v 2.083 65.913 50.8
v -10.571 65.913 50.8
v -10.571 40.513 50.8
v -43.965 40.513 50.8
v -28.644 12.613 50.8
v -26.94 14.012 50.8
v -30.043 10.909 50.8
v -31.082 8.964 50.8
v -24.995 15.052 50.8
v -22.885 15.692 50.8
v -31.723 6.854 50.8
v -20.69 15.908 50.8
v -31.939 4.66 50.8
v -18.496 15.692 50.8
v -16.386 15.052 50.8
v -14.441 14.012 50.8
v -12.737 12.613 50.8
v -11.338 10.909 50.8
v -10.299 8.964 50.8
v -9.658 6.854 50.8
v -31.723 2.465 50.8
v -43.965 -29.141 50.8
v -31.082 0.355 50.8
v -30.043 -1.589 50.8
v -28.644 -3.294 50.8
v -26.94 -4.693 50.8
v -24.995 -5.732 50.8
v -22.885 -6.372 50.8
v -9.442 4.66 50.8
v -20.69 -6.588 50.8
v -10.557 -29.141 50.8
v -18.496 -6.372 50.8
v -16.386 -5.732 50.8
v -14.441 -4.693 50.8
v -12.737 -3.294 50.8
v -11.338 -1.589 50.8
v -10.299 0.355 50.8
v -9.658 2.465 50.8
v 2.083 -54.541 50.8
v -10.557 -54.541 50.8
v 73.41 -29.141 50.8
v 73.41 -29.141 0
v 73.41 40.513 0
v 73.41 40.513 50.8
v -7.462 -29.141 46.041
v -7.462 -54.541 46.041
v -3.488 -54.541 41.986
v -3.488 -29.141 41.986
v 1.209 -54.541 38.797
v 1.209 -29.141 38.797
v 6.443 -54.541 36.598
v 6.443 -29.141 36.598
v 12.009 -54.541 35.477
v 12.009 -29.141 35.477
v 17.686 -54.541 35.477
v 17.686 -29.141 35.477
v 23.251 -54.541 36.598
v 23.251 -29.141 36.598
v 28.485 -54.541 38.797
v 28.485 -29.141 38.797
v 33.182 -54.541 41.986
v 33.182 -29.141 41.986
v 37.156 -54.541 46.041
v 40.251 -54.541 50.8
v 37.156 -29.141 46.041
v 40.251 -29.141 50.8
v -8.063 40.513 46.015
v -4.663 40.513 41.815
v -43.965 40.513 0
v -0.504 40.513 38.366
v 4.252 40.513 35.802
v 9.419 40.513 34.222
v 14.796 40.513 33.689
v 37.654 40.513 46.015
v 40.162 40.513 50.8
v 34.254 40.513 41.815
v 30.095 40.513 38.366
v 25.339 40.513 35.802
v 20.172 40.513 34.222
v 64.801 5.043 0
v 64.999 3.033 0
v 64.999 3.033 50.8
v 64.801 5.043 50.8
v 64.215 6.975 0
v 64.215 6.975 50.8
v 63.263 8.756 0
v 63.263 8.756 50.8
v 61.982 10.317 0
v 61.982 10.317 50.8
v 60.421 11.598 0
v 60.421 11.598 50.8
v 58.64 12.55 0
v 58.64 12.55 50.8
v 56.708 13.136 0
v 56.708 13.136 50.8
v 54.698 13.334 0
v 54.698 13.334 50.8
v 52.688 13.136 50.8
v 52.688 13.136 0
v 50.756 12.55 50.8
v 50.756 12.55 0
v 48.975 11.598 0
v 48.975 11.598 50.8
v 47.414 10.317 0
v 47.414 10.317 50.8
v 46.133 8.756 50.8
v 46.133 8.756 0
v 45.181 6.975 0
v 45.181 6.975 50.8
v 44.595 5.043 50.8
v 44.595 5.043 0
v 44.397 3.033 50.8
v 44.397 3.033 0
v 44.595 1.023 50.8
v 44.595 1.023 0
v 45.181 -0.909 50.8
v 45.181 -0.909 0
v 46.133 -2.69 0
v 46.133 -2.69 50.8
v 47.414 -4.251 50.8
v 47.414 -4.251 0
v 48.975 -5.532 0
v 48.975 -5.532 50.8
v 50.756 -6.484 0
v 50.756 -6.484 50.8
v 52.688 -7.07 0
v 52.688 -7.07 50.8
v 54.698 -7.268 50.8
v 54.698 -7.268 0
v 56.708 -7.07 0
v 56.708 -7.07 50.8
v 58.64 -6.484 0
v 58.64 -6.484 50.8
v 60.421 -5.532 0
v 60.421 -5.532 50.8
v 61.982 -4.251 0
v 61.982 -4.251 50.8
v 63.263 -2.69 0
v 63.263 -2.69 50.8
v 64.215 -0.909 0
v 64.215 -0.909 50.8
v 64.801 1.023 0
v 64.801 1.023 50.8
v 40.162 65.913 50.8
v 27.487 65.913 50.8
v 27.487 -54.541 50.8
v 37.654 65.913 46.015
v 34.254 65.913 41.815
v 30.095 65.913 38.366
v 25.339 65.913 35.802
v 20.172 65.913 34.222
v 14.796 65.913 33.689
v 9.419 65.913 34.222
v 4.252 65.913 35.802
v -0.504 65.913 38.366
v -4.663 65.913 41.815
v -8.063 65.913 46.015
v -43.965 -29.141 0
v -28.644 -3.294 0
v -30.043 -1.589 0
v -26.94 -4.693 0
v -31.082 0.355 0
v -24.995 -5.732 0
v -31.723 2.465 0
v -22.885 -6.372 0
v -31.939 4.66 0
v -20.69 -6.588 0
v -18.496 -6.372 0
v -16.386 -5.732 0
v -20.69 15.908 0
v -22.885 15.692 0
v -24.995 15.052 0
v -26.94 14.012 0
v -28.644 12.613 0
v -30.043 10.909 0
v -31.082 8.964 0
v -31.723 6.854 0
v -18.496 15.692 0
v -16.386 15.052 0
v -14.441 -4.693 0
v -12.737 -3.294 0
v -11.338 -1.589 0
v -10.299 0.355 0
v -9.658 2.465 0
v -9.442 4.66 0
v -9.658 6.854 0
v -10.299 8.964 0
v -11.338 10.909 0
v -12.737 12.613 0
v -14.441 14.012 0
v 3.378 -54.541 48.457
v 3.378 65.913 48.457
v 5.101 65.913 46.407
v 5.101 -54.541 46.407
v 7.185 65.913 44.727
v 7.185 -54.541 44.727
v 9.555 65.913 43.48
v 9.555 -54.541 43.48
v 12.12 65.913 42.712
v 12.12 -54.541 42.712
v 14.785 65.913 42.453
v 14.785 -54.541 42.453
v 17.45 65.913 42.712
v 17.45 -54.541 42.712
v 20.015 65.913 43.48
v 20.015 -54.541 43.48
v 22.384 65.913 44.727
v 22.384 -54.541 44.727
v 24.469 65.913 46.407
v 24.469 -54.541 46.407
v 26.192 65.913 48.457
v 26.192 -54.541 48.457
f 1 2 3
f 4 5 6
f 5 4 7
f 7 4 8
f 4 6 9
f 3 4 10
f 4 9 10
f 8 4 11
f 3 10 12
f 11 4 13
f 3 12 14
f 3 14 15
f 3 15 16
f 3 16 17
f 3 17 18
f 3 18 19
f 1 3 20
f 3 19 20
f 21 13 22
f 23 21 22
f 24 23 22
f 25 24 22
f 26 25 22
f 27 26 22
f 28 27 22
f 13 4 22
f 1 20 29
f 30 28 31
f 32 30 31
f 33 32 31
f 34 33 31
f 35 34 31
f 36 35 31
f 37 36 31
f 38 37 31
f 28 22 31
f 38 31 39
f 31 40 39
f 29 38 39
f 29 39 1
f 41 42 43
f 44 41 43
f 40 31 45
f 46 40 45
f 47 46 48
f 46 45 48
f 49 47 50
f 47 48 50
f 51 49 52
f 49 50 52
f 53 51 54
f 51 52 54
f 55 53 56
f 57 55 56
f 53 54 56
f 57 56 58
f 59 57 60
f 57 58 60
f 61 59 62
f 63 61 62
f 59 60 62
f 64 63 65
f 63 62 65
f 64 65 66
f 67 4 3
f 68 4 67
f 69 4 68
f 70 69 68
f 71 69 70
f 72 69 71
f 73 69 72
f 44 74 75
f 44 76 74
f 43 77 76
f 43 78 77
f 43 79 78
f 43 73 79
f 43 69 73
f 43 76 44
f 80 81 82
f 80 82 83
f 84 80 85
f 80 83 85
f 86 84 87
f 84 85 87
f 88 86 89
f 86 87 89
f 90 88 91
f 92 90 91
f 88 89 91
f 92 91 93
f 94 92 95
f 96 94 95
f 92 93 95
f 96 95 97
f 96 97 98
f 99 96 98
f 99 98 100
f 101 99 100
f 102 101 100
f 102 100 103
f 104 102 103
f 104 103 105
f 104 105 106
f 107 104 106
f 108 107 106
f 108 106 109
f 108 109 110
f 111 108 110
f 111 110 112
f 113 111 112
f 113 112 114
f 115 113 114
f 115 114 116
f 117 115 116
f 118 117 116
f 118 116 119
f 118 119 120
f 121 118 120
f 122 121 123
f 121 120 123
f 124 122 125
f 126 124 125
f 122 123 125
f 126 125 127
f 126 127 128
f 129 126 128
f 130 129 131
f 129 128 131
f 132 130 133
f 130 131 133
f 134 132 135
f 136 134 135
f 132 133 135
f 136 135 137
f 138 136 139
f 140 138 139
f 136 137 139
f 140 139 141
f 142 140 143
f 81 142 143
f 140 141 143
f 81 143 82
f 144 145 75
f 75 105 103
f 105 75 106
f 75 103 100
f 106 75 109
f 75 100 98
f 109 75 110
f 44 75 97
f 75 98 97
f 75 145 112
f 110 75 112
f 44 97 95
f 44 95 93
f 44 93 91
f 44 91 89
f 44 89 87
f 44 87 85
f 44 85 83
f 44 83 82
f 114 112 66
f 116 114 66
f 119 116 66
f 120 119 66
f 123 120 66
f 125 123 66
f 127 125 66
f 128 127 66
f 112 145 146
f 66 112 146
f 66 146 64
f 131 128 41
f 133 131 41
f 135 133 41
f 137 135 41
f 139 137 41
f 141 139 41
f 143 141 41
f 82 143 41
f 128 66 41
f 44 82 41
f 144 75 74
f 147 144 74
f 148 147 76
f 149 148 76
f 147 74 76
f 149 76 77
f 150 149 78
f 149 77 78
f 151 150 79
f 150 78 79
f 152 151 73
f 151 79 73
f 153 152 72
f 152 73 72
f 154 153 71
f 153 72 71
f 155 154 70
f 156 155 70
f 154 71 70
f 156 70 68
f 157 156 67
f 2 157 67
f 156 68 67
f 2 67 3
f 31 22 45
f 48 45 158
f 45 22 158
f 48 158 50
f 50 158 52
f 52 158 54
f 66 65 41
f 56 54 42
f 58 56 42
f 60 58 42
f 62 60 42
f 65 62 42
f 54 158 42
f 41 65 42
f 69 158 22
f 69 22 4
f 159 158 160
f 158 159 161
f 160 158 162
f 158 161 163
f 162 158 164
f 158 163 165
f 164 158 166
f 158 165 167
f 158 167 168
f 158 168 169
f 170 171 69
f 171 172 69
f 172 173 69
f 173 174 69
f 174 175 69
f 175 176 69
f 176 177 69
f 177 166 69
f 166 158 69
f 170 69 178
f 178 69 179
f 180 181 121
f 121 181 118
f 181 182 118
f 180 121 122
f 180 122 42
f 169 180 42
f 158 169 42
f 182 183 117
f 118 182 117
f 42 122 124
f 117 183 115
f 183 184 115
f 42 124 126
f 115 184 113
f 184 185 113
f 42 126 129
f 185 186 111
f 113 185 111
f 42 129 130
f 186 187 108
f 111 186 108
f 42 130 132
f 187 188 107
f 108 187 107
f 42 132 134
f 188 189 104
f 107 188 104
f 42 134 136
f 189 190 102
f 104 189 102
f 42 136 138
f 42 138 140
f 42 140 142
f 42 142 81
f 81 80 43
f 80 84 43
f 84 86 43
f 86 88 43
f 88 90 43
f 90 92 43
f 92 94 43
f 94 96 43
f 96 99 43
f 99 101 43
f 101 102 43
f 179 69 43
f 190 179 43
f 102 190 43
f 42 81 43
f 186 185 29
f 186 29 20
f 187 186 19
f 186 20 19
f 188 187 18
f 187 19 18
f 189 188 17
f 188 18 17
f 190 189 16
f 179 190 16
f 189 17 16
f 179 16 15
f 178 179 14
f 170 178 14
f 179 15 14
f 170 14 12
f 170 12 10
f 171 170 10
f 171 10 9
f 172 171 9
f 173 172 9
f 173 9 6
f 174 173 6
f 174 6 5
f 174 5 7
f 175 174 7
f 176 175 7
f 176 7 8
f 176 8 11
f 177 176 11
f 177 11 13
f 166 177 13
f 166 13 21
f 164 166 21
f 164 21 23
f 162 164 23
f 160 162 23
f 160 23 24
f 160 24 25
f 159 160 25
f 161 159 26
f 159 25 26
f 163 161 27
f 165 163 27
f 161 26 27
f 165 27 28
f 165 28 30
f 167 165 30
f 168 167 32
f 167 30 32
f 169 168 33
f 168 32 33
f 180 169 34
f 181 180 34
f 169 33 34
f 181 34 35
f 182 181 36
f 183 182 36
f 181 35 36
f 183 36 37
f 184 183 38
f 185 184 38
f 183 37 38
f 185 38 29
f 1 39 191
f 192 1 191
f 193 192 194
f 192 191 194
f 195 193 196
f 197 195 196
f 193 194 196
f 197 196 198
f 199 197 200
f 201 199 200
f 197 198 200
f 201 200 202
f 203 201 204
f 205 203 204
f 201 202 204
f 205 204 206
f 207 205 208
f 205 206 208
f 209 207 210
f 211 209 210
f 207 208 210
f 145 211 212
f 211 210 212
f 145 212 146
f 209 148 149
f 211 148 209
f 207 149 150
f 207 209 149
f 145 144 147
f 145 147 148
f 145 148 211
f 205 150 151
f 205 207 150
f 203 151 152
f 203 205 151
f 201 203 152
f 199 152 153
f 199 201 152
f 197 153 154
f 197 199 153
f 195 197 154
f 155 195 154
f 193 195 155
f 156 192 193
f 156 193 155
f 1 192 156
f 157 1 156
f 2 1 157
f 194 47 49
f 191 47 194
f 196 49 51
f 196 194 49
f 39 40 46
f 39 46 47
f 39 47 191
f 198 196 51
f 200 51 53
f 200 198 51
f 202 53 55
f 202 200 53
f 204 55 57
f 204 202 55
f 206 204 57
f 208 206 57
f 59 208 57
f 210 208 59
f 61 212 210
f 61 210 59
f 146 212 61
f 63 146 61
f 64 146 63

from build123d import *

# Parameters (mm, degrees)
F0_W      = 117.3750758171
F0_H      = 69.6533750743
F1_DEPTH  = 50.8
F3_DEPTH  = 25.4
F4_DEPTH  = 82.804
F6_DEPTH  = 25.4
F8_R      = 10.3010134133
F9_DEPTH  = 146.558
F7_R      = 11.2481723065
F10_DEPTH = 101.6


with BuildPart() as f1:
    # F0 (on Top) → F1 (new body)
    with BuildSketch(Plane.XY):
        with Locations((14.7226527333, 5.685989745)):
            Rectangle(F0_W, F0_H)
    extrude(amount=F1_DEPTH)

    # F2 (on face) → F3 (join)
    with BuildSketch(Plane.XZ.offset(29.1406977922)):
        with BuildLine():
            Line((2.0829490386, 50.8), (-10.5567546561, 50.8))
            ThreePointArc((-10.5567546561, 50.8), (14.8472036235, 35.3357176843), (40.2511619031, 50.8))
            Line((40.2511619031, 50.8), (27.4869073182, 50.8))
            ThreePointArc((27.4869073182, 50.8), (14.7849281784, 42.4531644715), (2.0829490386, 50.8))
        make_face()
    extrude(amount=F3_DEPTH)

    # F4 (cut): a face of the model
    f4_faces = [f1.faces().sort_by_distance(p)[0] for p in [
        (14.7849281784, -29.1406977922, 47.3563909232),
    ]]
    extrude(f4_faces, amount=-F4_DEPTH, mode=Mode.SUBTRACT)

    # F5 (on face) → F6 (join)
    with BuildSketch(Plane(origin=(0, 40.5126772821, 0), x_dir=(-1, 0, 0), z_dir=(0, 1, 0))):
        with BuildLine():
            ThreePointArc((-2.0829490386, 50.8), (-14.7849281784, 42.4531644715), (-27.4869073182, 50.8))
            Line((-27.4869073182, 50.8), (-40.1620790362, 50.8))
            ThreePointArc((-40.1620790362, 50.8), (-14.7955128923, 33.6886739467), (10.5710532516, 50.8))
            Line((10.5710532516, 50.8), (-2.0829490386, 50.8))
        make_face()
    extrude(amount=F6_DEPTH)

    # F8 (on face) → F9 (cut)
    with BuildSketch(Plane.XY.offset(50.8)):
        with Locations((54.6979308128, 3.0329860747)):
            Circle(F8_R)
    extrude(amount=-F9_DEPTH, mode=Mode.SUBTRACT)

    # F7 (on face) → F10 (cut)
    with BuildSketch(Plane.XY.offset(50.8)):
        with Locations((-20.6904988736, 4.6597607434)):
            Circle(F7_R)
    extrude(amount=-F10_DEPTH, mode=Mode.SUBTRACT)


solid = f1.part
